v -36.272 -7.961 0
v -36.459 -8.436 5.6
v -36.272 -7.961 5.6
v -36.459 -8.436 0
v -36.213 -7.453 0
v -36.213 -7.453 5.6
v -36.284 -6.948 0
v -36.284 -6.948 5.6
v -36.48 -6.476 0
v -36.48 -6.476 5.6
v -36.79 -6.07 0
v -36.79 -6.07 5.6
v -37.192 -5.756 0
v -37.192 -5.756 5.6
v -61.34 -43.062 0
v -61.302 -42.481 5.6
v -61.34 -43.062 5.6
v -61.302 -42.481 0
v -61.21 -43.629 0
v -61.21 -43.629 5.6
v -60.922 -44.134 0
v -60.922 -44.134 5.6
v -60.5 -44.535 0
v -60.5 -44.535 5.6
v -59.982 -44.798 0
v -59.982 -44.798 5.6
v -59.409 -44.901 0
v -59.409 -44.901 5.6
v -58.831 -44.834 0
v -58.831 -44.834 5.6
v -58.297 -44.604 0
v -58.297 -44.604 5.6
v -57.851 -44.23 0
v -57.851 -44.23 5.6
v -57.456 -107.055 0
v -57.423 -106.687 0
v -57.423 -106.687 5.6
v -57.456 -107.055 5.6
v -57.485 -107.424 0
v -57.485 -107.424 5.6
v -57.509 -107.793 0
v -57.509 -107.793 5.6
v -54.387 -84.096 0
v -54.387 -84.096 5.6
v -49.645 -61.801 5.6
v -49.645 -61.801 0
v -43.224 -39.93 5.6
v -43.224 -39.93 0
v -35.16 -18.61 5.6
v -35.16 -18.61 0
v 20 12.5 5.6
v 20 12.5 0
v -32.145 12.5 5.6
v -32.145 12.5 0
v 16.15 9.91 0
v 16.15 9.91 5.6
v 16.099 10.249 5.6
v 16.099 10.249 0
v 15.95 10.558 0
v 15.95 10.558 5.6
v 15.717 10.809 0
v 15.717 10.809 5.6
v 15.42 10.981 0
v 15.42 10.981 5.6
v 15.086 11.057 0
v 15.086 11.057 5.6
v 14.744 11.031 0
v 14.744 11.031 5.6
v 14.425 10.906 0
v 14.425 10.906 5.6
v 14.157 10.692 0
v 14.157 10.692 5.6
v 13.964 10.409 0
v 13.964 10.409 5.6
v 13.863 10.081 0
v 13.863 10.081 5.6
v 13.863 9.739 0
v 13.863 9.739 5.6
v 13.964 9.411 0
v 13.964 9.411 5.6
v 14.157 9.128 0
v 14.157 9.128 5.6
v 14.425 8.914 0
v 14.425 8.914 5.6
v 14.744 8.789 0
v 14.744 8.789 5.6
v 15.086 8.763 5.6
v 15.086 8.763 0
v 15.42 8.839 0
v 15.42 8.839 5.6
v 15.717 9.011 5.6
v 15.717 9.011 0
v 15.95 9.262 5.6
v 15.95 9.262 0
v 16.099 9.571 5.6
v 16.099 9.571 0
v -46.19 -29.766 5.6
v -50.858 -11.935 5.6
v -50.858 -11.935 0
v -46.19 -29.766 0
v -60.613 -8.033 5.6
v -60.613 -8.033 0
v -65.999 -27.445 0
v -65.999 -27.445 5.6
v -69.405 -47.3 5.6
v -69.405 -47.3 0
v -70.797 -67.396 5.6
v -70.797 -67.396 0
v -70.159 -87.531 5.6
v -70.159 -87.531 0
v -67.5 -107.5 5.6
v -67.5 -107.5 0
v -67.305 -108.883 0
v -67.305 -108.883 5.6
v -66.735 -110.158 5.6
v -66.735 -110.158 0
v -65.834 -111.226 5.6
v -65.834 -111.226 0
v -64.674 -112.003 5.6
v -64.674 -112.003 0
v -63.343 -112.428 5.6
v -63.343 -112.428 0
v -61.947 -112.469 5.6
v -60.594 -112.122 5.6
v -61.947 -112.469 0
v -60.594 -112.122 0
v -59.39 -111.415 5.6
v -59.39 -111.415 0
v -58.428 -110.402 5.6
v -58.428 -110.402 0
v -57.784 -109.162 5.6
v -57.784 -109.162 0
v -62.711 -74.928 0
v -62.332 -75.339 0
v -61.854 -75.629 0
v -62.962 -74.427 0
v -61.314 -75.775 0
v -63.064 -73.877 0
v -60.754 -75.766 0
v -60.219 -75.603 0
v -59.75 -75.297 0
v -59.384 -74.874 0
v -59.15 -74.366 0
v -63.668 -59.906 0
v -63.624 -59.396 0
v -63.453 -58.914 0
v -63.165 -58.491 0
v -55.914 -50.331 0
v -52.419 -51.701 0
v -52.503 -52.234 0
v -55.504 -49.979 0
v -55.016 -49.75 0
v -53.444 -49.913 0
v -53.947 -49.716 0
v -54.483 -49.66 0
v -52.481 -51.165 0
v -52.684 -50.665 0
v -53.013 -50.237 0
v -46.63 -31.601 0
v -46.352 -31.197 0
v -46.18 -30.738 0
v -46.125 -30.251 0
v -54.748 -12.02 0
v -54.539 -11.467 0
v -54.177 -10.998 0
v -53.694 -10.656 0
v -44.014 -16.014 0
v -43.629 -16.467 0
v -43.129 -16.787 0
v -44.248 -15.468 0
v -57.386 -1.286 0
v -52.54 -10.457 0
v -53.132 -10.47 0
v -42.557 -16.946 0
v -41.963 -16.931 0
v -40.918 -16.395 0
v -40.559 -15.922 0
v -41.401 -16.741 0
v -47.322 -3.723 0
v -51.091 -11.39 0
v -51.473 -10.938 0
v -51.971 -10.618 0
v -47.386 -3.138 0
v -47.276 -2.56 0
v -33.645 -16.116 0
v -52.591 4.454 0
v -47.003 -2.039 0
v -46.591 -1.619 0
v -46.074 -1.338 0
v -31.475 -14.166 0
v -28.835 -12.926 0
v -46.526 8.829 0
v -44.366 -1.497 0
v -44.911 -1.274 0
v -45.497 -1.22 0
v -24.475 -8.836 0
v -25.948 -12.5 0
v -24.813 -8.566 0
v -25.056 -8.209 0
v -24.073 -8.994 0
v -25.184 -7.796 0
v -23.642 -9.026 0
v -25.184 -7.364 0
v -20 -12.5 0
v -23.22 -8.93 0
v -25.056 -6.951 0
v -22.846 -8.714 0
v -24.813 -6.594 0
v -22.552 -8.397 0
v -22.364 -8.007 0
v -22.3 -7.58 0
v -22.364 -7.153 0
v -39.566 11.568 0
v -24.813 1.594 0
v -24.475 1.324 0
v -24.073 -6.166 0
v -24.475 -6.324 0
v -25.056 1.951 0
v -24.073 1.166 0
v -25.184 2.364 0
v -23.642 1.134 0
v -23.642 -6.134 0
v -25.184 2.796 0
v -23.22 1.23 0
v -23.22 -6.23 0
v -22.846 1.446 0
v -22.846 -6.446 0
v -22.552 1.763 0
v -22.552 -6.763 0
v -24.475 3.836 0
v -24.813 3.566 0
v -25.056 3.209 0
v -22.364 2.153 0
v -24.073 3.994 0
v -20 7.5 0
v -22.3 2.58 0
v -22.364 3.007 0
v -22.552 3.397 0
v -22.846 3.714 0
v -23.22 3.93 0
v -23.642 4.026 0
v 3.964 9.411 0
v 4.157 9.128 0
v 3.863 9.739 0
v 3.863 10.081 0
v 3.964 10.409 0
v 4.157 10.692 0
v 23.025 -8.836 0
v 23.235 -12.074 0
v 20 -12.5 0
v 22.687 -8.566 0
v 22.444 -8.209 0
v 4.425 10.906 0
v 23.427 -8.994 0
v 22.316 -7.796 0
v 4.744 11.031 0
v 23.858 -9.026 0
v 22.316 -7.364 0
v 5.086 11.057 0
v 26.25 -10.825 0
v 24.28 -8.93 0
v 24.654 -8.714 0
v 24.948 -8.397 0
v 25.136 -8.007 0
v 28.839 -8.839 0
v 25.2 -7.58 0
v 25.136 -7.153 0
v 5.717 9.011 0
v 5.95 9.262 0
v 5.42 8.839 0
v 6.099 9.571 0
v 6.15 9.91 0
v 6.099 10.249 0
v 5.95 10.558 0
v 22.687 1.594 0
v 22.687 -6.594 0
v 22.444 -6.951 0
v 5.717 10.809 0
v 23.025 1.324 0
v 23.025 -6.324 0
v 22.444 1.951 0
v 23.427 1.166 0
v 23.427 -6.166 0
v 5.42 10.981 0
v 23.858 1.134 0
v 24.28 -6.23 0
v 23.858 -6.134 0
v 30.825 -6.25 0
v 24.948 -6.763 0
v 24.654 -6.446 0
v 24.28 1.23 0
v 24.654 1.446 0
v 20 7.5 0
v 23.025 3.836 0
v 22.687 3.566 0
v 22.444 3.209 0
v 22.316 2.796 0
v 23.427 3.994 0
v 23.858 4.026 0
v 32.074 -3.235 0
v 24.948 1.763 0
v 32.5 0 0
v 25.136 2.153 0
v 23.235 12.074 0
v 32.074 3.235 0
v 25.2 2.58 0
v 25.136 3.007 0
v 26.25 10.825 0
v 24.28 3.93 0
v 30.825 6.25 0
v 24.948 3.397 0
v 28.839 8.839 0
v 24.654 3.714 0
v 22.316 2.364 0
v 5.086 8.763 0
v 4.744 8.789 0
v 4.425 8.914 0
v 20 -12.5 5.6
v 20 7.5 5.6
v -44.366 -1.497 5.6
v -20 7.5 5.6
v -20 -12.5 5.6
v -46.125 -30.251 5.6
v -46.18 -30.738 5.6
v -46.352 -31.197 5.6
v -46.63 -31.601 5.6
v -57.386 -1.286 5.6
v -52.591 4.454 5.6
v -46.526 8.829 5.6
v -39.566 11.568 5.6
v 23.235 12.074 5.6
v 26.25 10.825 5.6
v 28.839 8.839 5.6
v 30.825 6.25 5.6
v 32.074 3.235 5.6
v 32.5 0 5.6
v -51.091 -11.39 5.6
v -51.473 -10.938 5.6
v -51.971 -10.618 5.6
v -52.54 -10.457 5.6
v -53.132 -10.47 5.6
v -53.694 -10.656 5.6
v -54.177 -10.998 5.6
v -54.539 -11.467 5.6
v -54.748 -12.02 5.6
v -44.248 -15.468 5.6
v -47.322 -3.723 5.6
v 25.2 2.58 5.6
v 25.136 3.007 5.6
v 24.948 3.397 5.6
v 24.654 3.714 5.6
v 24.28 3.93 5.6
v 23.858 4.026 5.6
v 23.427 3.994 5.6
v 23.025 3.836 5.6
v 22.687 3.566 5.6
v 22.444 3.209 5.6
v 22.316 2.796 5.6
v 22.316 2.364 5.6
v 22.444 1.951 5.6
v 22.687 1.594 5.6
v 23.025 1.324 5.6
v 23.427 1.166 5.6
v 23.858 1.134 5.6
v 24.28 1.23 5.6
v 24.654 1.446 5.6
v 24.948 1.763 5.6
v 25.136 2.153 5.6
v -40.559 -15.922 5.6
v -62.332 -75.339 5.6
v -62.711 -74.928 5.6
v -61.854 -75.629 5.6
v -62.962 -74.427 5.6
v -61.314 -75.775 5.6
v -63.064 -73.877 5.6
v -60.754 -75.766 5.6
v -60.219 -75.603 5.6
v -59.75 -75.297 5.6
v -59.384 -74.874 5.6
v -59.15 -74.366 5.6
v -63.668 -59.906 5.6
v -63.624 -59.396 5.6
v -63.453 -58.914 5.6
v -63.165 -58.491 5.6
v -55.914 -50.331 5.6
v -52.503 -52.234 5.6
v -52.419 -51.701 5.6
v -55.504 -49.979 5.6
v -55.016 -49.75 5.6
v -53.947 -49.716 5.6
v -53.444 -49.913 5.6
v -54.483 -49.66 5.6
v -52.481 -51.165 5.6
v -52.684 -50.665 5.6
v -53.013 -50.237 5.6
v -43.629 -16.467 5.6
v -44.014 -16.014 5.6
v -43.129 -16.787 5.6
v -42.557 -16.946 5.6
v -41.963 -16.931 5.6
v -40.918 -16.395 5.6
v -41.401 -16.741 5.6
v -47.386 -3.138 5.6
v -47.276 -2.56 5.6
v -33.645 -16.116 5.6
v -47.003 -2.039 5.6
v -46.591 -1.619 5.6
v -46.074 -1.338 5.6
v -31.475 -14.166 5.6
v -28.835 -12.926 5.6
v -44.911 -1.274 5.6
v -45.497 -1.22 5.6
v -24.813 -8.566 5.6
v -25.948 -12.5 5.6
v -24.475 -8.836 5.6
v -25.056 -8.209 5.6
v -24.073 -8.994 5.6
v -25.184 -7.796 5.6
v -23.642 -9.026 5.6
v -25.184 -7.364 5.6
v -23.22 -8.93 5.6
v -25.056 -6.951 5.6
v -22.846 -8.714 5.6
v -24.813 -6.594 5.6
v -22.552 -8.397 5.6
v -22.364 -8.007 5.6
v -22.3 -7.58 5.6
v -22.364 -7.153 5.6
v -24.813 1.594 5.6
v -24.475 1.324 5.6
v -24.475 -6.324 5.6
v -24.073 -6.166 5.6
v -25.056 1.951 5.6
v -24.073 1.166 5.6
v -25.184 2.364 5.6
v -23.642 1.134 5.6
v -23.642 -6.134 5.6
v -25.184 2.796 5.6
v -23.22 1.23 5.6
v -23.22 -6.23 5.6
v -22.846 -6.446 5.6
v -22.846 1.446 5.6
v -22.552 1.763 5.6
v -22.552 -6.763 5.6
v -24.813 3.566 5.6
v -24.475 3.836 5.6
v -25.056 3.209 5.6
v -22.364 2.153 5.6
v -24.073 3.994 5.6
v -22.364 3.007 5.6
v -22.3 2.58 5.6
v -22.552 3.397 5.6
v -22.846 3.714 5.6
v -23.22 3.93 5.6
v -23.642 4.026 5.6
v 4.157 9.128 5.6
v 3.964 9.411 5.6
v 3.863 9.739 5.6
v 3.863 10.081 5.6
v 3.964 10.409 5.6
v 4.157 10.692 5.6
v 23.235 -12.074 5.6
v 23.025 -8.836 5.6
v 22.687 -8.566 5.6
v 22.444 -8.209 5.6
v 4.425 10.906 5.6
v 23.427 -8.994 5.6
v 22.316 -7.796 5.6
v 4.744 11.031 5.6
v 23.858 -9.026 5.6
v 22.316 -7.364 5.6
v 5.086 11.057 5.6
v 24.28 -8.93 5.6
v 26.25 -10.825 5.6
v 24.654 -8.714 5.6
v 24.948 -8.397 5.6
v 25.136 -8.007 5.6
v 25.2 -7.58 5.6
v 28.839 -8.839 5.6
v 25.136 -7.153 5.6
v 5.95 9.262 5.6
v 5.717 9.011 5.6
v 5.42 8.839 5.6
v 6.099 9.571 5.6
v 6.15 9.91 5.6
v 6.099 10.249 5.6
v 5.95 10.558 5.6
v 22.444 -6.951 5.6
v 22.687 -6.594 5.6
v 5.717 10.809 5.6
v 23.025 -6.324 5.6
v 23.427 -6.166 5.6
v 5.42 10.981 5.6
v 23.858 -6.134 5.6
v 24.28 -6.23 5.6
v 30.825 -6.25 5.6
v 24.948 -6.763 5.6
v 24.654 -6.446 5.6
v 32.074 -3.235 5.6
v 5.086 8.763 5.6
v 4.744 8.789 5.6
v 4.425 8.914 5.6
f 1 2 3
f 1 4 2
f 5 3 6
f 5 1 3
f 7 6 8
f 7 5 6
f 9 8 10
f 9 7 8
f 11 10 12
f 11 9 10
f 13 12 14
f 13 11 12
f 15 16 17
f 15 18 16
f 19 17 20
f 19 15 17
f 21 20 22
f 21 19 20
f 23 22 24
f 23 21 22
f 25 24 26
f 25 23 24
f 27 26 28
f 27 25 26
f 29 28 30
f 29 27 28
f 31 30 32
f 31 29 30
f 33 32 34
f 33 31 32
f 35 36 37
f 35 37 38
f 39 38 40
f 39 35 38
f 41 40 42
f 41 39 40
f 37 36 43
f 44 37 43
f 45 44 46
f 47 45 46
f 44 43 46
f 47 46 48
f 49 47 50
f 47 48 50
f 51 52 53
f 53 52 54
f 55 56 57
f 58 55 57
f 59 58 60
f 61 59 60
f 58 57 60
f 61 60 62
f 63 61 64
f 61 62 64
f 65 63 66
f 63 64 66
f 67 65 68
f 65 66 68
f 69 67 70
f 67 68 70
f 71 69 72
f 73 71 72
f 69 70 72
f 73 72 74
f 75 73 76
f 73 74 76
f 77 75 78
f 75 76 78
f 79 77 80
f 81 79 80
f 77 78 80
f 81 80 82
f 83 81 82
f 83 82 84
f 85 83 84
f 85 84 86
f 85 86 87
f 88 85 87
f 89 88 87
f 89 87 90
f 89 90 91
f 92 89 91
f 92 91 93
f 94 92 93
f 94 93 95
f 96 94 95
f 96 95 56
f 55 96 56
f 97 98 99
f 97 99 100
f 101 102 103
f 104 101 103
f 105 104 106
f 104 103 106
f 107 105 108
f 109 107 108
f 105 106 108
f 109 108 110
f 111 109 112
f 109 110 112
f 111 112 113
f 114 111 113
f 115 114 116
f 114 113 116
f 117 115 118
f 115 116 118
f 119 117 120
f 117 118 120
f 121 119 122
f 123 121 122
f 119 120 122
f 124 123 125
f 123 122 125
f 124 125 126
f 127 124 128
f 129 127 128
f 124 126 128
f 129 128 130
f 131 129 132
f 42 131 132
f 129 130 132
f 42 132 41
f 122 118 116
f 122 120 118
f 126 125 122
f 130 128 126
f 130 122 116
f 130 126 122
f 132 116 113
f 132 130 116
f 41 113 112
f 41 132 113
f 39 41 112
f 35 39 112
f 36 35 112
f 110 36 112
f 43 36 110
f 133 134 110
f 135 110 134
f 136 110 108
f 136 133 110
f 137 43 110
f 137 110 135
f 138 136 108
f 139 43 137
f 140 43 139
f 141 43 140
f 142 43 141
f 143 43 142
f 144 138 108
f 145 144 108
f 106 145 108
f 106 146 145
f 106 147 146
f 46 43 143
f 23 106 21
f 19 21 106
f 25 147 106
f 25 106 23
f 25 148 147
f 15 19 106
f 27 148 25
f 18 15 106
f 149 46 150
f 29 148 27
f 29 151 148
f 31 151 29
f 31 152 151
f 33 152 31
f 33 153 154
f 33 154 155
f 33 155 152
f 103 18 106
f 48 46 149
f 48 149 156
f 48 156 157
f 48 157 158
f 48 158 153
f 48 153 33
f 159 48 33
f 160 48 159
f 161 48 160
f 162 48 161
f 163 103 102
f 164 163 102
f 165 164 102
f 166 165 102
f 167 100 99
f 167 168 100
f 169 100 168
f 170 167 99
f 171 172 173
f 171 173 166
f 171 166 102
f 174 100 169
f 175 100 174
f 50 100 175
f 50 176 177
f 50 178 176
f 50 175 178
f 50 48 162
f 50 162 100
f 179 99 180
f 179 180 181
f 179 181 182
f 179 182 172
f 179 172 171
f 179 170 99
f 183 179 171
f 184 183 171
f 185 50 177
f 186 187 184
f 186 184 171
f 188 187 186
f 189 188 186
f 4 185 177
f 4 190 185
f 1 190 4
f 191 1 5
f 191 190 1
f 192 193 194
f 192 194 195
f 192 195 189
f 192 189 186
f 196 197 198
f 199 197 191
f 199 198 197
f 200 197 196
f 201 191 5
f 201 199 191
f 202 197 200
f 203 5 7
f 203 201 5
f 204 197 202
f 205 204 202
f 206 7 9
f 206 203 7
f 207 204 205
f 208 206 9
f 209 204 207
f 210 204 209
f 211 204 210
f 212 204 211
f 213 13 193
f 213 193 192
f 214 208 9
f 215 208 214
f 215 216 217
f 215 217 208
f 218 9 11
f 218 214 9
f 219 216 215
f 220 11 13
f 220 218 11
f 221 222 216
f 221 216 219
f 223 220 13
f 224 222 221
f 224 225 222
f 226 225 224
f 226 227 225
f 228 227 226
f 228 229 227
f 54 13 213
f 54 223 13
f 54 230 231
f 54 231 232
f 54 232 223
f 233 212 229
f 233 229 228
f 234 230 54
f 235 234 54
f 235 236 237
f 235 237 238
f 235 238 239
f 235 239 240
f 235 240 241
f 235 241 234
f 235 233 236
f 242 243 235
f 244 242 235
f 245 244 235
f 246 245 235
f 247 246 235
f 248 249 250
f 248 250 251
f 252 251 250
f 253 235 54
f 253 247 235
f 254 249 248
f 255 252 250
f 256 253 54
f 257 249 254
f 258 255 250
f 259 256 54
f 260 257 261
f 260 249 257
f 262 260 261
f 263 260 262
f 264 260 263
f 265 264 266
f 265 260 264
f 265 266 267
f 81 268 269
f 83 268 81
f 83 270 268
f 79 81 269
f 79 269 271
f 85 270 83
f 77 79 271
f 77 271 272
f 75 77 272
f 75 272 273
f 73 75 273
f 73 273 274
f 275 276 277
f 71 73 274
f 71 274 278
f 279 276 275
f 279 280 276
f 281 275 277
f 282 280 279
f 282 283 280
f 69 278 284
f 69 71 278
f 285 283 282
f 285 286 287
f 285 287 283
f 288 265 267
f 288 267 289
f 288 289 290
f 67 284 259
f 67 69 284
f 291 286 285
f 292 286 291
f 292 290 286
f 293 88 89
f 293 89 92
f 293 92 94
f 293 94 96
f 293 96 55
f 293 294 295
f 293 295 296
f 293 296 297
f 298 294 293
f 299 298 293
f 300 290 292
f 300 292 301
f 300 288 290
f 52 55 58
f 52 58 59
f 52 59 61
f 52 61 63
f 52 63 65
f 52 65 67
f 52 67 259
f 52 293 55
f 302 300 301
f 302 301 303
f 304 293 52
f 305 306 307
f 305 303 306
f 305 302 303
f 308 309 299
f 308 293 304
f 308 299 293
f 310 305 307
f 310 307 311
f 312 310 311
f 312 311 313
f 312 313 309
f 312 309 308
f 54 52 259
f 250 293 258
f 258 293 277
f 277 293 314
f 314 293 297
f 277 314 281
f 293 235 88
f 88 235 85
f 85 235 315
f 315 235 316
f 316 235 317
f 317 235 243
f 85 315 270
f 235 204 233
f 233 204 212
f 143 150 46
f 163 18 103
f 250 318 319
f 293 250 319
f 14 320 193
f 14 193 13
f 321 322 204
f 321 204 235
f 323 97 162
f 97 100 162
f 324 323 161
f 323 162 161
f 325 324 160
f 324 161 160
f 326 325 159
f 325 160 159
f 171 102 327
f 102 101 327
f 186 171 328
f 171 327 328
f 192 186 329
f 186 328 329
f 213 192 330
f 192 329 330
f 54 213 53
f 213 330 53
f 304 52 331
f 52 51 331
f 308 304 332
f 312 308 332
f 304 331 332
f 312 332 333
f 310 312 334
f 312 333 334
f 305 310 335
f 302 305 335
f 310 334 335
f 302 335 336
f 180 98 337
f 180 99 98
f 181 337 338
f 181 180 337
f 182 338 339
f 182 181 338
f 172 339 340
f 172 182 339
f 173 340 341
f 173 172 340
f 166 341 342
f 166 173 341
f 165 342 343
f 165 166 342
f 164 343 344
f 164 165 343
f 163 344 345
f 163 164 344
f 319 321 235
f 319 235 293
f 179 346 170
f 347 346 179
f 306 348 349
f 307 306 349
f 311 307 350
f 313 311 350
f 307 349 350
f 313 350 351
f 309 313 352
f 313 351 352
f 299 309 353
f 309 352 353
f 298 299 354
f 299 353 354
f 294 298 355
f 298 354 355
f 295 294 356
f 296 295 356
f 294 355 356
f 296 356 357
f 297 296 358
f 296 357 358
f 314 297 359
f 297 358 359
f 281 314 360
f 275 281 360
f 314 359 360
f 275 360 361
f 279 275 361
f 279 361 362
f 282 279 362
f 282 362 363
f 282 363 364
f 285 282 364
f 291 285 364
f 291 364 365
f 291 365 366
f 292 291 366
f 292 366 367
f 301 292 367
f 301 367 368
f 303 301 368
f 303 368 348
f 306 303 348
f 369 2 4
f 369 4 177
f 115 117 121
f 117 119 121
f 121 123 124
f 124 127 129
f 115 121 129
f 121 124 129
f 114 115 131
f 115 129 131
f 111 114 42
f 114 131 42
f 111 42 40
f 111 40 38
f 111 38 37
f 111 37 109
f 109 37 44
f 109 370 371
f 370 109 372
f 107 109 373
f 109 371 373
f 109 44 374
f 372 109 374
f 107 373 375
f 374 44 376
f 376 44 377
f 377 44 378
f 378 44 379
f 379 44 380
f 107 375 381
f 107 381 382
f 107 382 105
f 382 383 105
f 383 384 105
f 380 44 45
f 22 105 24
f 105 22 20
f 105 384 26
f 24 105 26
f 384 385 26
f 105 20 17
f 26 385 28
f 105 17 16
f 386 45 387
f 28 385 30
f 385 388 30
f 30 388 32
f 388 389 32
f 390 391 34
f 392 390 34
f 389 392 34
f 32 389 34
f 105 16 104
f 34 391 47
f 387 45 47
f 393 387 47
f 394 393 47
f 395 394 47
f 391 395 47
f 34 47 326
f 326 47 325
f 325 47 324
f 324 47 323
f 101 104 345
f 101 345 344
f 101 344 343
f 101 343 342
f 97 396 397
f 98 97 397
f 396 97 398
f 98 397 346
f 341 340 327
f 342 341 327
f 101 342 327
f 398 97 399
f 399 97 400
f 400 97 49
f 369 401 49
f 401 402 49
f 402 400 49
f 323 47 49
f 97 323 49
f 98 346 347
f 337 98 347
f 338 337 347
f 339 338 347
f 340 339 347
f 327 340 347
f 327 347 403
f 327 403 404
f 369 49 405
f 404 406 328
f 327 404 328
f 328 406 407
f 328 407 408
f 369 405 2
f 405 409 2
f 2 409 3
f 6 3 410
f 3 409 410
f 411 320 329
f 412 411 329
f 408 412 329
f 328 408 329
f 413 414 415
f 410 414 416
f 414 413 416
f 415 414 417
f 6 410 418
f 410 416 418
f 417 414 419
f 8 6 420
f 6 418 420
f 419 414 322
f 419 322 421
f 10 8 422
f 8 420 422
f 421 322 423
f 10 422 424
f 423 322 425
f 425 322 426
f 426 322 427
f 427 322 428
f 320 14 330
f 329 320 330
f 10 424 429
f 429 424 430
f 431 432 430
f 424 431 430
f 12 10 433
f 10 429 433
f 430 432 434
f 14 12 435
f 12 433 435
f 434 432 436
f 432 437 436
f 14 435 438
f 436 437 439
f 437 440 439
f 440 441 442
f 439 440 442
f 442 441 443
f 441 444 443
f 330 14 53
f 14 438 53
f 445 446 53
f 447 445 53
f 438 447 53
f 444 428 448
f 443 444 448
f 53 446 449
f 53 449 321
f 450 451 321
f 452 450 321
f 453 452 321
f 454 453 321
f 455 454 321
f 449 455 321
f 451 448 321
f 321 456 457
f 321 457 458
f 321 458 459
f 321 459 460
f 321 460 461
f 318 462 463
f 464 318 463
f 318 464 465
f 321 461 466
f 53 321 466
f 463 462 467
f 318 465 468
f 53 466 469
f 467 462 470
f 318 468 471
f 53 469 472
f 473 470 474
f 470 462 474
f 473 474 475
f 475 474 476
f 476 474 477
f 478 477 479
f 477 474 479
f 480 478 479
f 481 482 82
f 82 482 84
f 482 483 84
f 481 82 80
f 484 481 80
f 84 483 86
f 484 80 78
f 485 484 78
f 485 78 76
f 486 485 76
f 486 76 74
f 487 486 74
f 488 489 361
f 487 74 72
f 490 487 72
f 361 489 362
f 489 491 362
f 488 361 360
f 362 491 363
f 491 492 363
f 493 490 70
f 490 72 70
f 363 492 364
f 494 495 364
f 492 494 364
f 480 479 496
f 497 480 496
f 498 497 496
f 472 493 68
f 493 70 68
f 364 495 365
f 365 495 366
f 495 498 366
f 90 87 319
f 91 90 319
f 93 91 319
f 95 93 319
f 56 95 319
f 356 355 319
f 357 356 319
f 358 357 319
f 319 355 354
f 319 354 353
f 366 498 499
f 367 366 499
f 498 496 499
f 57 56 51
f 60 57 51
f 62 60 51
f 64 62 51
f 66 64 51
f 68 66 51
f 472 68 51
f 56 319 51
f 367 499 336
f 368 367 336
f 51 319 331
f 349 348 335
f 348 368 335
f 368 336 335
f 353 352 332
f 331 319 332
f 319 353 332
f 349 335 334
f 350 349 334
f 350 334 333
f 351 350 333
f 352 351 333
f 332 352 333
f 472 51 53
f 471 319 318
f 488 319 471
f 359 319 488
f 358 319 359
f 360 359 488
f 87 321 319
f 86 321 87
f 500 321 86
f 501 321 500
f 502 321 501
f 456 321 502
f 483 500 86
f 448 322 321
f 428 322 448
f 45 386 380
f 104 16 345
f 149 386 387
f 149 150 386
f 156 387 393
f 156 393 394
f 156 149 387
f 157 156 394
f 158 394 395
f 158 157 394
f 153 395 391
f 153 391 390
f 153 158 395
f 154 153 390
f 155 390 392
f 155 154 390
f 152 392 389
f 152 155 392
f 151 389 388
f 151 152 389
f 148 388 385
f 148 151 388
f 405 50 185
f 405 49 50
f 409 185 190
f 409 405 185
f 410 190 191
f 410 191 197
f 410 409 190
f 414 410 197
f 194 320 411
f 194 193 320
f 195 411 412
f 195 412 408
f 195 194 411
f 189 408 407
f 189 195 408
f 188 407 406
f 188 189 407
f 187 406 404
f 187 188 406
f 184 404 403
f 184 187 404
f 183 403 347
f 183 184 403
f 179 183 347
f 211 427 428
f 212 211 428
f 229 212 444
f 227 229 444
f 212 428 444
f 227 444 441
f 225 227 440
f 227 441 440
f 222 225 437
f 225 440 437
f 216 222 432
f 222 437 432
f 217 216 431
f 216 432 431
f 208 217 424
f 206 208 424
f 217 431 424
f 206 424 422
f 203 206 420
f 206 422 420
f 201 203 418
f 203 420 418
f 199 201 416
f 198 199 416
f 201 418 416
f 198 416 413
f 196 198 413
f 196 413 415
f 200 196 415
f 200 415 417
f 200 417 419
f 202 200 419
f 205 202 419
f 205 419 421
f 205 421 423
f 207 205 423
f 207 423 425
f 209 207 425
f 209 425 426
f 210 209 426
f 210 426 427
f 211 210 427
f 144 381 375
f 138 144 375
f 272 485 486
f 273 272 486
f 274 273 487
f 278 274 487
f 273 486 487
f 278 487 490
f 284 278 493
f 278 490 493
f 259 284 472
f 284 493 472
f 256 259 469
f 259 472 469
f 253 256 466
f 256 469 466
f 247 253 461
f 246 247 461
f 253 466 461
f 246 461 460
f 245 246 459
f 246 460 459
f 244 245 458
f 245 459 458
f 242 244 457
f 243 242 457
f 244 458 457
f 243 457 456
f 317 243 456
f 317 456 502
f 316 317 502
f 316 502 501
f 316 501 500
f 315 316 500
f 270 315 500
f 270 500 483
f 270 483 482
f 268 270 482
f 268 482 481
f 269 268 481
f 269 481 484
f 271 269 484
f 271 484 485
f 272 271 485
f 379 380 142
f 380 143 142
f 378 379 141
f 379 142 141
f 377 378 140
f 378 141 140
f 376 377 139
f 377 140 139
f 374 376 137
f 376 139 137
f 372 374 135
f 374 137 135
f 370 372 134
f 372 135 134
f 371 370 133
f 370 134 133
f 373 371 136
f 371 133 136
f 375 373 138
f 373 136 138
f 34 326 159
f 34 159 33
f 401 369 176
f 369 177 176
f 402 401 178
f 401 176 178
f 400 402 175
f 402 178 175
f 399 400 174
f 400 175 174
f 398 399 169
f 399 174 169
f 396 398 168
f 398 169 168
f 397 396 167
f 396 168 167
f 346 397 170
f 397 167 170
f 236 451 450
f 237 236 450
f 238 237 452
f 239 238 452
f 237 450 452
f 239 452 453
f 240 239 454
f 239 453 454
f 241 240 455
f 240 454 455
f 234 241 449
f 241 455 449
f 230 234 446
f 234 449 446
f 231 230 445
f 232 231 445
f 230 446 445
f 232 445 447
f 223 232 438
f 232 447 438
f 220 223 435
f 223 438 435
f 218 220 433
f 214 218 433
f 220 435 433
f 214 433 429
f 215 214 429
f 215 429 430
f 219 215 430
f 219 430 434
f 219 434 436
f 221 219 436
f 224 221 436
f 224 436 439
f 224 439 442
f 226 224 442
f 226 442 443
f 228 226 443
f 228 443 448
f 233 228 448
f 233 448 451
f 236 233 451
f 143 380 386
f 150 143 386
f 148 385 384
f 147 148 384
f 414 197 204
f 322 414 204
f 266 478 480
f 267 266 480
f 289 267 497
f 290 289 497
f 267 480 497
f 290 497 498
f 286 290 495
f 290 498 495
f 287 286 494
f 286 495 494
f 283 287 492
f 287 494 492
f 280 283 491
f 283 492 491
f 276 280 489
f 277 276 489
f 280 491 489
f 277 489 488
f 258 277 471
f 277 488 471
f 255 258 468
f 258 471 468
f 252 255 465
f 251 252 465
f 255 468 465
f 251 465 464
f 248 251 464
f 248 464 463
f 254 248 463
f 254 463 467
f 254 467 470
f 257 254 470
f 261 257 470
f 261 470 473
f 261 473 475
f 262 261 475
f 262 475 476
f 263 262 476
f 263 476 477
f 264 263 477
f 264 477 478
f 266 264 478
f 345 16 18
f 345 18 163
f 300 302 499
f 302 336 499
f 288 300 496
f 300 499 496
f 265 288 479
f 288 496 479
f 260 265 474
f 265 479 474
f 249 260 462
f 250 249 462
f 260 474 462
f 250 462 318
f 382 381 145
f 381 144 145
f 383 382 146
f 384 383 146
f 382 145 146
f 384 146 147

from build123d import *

# Parameters (mm, degrees)
BOSS_EXTRU_1_DEPTH      = 5.6
ENL_V_MAT_EXTRU_1_REACH = 135.059
ESQUISSE2_W             = 40
ESQUISSE2_H             = 20
ENL_V_MAT_EXTRU_2_REACH = 135.059
ESQUISSE3_R             = 1.45
CONG_2_R                = 12.5
CONG_3_R                = 10
CONG_4_R                = 30
CONG_5_R                = 30
ENL_V_MAT_EXTRU_3_REACH = 135.059
CONG_6_R                = 2
ENL_V_MAT_EXTRU_4_REACH = 135.059
ESQUISSE5_R             = 1.15


# Some blends are built 0.0001 mm under size
with BuildPart() as part:
    # Esquisse1 → Boss.-Extru.1 (new body)
    with BuildSketch(Plane.XY):
        with BuildLine():
            Line((-32.5, 12.5), (-52.5, 12.5))
            ThreePointArc((-52.5, 12.5), (-69.287355537, -46.339080558), (-67.5, -107.5))
            ThreePointArc((-67.5, -107.5), (-62.5, -112.5), (-57.5, -107.5))
            ThreePointArc((-57.5, -107.5), (-48.914858734, -58.969774017), (-32.5, -12.5))
            Line((-32.5, -12.5), (32.5, -12.5))
            Line((32.5, -12.5), (32.5, 12.5))
            Line((32.5, 12.5), (-32.5, 12.5))
        make_face()
    extrude(amount=BOSS_EXTRU_1_DEPTH)

    # Esquisse2 → Enlèv. mat.-Extru.1 (cut, up to next)
    with BuildSketch(Plane.XY.offset(5.6), mode=Mode.PRIVATE) as enl_v_mat_extru_1_sk1:
        with Locations((0, -2.5)):
            Rectangle(ESQUISSE2_W, ESQUISSE2_H)
    enl_v_mat_extru_1_tool1 = extrude(enl_v_mat_extru_1_sk1.sketch, amount=-ENL_V_MAT_EXTRU_1_REACH, mode=Mode.PRIVATE) & part.part
    add(enl_v_mat_extru_1_tool1.solids().sort_by_distance((0, -2.5, 5.6))[0], mode=Mode.SUBTRACT)

    # Esquisse3 → Enlèv. mat.-Extru.2 (cut, up to next)
    with BuildSketch(Plane.XY.offset(5.6), mode=Mode.PRIVATE) as enl_v_mat_extru_2_sk1:
        with Locations((-23.75, -7.58)):
            Circle(ESQUISSE3_R)
    enl_v_mat_extru_2_tool1 = extrude(enl_v_mat_extru_2_sk1.sketch, amount=-ENL_V_MAT_EXTRU_2_REACH, mode=Mode.PRIVATE) & part.part
    # Esquisse3 → Enlèv. mat.-Extru.2 (cut, up to next)
    with BuildSketch(Plane.XY.offset(5.6), mode=Mode.PRIVATE) as enl_v_mat_extru_2_sk2:
        with Locations((23.75, -7.58)):
            Circle(ESQUISSE3_R)
    enl_v_mat_extru_2_tool2 = extrude(enl_v_mat_extru_2_sk2.sketch, amount=-ENL_V_MAT_EXTRU_2_REACH, mode=Mode.PRIVATE) & part.part
    # Esquisse3 → Enlèv. mat.-Extru.2 (cut, up to next)
    with BuildSketch(Plane.XY.offset(5.6), mode=Mode.PRIVATE) as enl_v_mat_extru_2_sk3:
        with Locations((23.75, 2.58)):
            Circle(ESQUISSE3_R)
    enl_v_mat_extru_2_tool3 = extrude(enl_v_mat_extru_2_sk3.sketch, amount=-ENL_V_MAT_EXTRU_2_REACH, mode=Mode.PRIVATE) & part.part
    # Esquisse3 → Enlèv. mat.-Extru.2 (cut, up to next)
    with BuildSketch(Plane.XY.offset(5.6), mode=Mode.PRIVATE) as enl_v_mat_extru_2_sk4:
        with Locations((-23.75, 2.58)):
            Circle(ESQUISSE3_R)
    enl_v_mat_extru_2_tool4 = extrude(enl_v_mat_extru_2_sk4.sketch, amount=-ENL_V_MAT_EXTRU_2_REACH, mode=Mode.PRIVATE) & part.part
    add(enl_v_mat_extru_2_tool1.solids().sort_by_distance((-23.75, -7.58, 5.6))[0], mode=Mode.SUBTRACT)
    add(enl_v_mat_extru_2_tool2.solids().sort_by_distance((23.75, -7.58, 5.6))[0], mode=Mode.SUBTRACT)
    add(enl_v_mat_extru_2_tool3.solids().sort_by_distance((23.75, 2.58, 5.6))[0], mode=Mode.SUBTRACT)
    add(enl_v_mat_extru_2_tool4.solids().sort_by_distance((-23.75, 2.58, 5.6))[0], mode=Mode.SUBTRACT)

    # Congé2
    cong_2_edges = [part.edges().sort_by_distance(p)[0] for p in [
        (32.5, -12.5, 2.8),
        (32.5, 12.5, 2.8),
    ]]
    fillet(cong_2_edges, radius=CONG_2_R - 0.0001)  # a hair under: the kernel refuses the full size

    # Congé3
    cong_3_edges = [part.edges().sort_by_distance(p)[0] for p in [
        (-32.5, -12.5, 2.8),
    ]]
    fillet(cong_3_edges, radius=CONG_3_R)

    # Congé4
    cong_4_edges = [part.edges().sort_by_distance(p)[0] for p in [
        (-52.5, 12.5, 2.8),
    ]]
    fillet(cong_4_edges, radius=CONG_4_R)

    # Congé5
    # the kernel refuses this fillet: 30 mm, written as the material it adds along each edge
    with BuildSketch(Plane(origin=(-57.5, -107.5, 0), x_dir=(-0.029294676062998543, -0.9995708188789647, 0), z_dir=(0, 0, 1))) as cong_5_piece_1:
        with BuildLine():
            CenterArc((1.171787043, 29.987124566), CONG_5_R, 266.202223448, 2.119075089)
            ThreePointArc((-0.815268333, 0.053003384), (-0.407652209, 0.026224165), (0, 0))
            ThreePointArc((0, 0), (0.14647338, 0.002145906), (0.292946761, 0))
        make_face()
    extrude(amount=5.6)

    # Esquisse4 → Enlèv. mat.-Extru.3 (cut, up to next)
    with BuildSketch(Plane.XY.offset(5.6), mode=Mode.PRIVATE) as enl_v_mat_extru_3_sk1:
        Polygon((-35.530484253, -6.741676359), (-42.974151572, -20.332321303), (-48.555833289, 0.989708193), align=None)
    enl_v_mat_extru_3_tool1 = extrude(enl_v_mat_extru_3_sk1.sketch, amount=-ENL_V_MAT_EXTRU_3_REACH, mode=Mode.PRIVATE) & part.part
    # Esquisse4 → Enlèv. mat.-Extru.3 (cut, up to next)
    with BuildSketch(Plane.XY.offset(5.6), mode=Mode.PRIVATE) as enl_v_mat_extru_3_sk2:
        Polygon((-52.982896502, -3.816878406), (-45.919055028, -30.800759586), (-62.900626013, -49.913479621), align=None)
    enl_v_mat_extru_3_tool2 = extrude(enl_v_mat_extru_3_sk2.sketch, amount=-ENL_V_MAT_EXTRU_3_REACH, mode=Mode.PRIVATE) & part.part
    # Esquisse4 → Enlèv. mat.-Extru.3 (cut, up to next)
    with BuildSketch(Plane.XY.offset(5.6), mode=Mode.PRIVATE) as enl_v_mat_extru_3_sk3:
        Polygon((-49.898192375, -43.559912364), (-63.702500518, -59.0966302), (-62.552958266, -85.696486809), align=None)
    enl_v_mat_extru_3_tool3 = extrude(enl_v_mat_extru_3_sk3.sketch, amount=-ENL_V_MAT_EXTRU_3_REACH, mode=Mode.PRIVATE) & part.part
    add(enl_v_mat_extru_3_tool1.solids().sort_by_distance((-42.35349, -8.694763, 5.6))[0], mode=Mode.SUBTRACT)
    add(enl_v_mat_extru_3_tool2.solids().sort_by_distance((-53.934193, -28.177039, 5.6))[0], mode=Mode.SUBTRACT)
    add(enl_v_mat_extru_3_tool3.solids().sort_by_distance((-58.717884, -62.784343, 5.6))[0], mode=Mode.SUBTRACT)

    # Congé6
    cong_6_edges = [part.edges().sort_by_distance(p)[0] for p in [
        (-48.555833289, 0.989708193, 2.8),
        (-35.530484253, -6.741676359, 2.8),
        (-42.974151572, -20.332321303, 2.8),
        (-62.900626013, -49.913479621, 2.8),
        (-52.982896502, -3.816878406, 2.8),
        (-45.919055028, -30.800759586, 2.8),
        (-49.898192375, -43.559912364, 2.8),
        (-62.552958266, -85.696486809, 2.8),
        (-63.702500518, -59.0966302, 2.8),
    ]]
    fillet(cong_6_edges, radius=CONG_6_R)

    # Esquisse5 → Enlèv. mat.-Extru.4 (cut, up to next)
    with BuildSketch(Plane.XY.offset(5.6), mode=Mode.PRIVATE) as enl_v_mat_extru_4_sk1:
        with Locations((15, 9.91)):
            Circle(ESQUISSE5_R)
    enl_v_mat_extru_4_tool1 = extrude(enl_v_mat_extru_4_sk1.sketch, amount=-ENL_V_MAT_EXTRU_4_REACH, mode=Mode.PRIVATE) & part.part
    # Esquisse5 → Enlèv. mat.-Extru.4 (cut, up to next)
    with BuildSketch(Plane.XY.offset(5.6), mode=Mode.PRIVATE) as enl_v_mat_extru_4_sk2:
        with Locations((5, 9.91)):
            Circle(ESQUISSE5_R)
    enl_v_mat_extru_4_tool2 = extrude(enl_v_mat_extru_4_sk2.sketch, amount=-ENL_V_MAT_EXTRU_4_REACH, mode=Mode.PRIVATE) & part.part
    add(enl_v_mat_extru_4_tool1.solids().sort_by_distance((15, 9.91, 5.6))[0], mode=Mode.SUBTRACT)
    add(enl_v_mat_extru_4_tool2.solids().sort_by_distance((5, 9.91, 5.6))[0], mode=Mode.SUBTRACT)


solid = part.part
